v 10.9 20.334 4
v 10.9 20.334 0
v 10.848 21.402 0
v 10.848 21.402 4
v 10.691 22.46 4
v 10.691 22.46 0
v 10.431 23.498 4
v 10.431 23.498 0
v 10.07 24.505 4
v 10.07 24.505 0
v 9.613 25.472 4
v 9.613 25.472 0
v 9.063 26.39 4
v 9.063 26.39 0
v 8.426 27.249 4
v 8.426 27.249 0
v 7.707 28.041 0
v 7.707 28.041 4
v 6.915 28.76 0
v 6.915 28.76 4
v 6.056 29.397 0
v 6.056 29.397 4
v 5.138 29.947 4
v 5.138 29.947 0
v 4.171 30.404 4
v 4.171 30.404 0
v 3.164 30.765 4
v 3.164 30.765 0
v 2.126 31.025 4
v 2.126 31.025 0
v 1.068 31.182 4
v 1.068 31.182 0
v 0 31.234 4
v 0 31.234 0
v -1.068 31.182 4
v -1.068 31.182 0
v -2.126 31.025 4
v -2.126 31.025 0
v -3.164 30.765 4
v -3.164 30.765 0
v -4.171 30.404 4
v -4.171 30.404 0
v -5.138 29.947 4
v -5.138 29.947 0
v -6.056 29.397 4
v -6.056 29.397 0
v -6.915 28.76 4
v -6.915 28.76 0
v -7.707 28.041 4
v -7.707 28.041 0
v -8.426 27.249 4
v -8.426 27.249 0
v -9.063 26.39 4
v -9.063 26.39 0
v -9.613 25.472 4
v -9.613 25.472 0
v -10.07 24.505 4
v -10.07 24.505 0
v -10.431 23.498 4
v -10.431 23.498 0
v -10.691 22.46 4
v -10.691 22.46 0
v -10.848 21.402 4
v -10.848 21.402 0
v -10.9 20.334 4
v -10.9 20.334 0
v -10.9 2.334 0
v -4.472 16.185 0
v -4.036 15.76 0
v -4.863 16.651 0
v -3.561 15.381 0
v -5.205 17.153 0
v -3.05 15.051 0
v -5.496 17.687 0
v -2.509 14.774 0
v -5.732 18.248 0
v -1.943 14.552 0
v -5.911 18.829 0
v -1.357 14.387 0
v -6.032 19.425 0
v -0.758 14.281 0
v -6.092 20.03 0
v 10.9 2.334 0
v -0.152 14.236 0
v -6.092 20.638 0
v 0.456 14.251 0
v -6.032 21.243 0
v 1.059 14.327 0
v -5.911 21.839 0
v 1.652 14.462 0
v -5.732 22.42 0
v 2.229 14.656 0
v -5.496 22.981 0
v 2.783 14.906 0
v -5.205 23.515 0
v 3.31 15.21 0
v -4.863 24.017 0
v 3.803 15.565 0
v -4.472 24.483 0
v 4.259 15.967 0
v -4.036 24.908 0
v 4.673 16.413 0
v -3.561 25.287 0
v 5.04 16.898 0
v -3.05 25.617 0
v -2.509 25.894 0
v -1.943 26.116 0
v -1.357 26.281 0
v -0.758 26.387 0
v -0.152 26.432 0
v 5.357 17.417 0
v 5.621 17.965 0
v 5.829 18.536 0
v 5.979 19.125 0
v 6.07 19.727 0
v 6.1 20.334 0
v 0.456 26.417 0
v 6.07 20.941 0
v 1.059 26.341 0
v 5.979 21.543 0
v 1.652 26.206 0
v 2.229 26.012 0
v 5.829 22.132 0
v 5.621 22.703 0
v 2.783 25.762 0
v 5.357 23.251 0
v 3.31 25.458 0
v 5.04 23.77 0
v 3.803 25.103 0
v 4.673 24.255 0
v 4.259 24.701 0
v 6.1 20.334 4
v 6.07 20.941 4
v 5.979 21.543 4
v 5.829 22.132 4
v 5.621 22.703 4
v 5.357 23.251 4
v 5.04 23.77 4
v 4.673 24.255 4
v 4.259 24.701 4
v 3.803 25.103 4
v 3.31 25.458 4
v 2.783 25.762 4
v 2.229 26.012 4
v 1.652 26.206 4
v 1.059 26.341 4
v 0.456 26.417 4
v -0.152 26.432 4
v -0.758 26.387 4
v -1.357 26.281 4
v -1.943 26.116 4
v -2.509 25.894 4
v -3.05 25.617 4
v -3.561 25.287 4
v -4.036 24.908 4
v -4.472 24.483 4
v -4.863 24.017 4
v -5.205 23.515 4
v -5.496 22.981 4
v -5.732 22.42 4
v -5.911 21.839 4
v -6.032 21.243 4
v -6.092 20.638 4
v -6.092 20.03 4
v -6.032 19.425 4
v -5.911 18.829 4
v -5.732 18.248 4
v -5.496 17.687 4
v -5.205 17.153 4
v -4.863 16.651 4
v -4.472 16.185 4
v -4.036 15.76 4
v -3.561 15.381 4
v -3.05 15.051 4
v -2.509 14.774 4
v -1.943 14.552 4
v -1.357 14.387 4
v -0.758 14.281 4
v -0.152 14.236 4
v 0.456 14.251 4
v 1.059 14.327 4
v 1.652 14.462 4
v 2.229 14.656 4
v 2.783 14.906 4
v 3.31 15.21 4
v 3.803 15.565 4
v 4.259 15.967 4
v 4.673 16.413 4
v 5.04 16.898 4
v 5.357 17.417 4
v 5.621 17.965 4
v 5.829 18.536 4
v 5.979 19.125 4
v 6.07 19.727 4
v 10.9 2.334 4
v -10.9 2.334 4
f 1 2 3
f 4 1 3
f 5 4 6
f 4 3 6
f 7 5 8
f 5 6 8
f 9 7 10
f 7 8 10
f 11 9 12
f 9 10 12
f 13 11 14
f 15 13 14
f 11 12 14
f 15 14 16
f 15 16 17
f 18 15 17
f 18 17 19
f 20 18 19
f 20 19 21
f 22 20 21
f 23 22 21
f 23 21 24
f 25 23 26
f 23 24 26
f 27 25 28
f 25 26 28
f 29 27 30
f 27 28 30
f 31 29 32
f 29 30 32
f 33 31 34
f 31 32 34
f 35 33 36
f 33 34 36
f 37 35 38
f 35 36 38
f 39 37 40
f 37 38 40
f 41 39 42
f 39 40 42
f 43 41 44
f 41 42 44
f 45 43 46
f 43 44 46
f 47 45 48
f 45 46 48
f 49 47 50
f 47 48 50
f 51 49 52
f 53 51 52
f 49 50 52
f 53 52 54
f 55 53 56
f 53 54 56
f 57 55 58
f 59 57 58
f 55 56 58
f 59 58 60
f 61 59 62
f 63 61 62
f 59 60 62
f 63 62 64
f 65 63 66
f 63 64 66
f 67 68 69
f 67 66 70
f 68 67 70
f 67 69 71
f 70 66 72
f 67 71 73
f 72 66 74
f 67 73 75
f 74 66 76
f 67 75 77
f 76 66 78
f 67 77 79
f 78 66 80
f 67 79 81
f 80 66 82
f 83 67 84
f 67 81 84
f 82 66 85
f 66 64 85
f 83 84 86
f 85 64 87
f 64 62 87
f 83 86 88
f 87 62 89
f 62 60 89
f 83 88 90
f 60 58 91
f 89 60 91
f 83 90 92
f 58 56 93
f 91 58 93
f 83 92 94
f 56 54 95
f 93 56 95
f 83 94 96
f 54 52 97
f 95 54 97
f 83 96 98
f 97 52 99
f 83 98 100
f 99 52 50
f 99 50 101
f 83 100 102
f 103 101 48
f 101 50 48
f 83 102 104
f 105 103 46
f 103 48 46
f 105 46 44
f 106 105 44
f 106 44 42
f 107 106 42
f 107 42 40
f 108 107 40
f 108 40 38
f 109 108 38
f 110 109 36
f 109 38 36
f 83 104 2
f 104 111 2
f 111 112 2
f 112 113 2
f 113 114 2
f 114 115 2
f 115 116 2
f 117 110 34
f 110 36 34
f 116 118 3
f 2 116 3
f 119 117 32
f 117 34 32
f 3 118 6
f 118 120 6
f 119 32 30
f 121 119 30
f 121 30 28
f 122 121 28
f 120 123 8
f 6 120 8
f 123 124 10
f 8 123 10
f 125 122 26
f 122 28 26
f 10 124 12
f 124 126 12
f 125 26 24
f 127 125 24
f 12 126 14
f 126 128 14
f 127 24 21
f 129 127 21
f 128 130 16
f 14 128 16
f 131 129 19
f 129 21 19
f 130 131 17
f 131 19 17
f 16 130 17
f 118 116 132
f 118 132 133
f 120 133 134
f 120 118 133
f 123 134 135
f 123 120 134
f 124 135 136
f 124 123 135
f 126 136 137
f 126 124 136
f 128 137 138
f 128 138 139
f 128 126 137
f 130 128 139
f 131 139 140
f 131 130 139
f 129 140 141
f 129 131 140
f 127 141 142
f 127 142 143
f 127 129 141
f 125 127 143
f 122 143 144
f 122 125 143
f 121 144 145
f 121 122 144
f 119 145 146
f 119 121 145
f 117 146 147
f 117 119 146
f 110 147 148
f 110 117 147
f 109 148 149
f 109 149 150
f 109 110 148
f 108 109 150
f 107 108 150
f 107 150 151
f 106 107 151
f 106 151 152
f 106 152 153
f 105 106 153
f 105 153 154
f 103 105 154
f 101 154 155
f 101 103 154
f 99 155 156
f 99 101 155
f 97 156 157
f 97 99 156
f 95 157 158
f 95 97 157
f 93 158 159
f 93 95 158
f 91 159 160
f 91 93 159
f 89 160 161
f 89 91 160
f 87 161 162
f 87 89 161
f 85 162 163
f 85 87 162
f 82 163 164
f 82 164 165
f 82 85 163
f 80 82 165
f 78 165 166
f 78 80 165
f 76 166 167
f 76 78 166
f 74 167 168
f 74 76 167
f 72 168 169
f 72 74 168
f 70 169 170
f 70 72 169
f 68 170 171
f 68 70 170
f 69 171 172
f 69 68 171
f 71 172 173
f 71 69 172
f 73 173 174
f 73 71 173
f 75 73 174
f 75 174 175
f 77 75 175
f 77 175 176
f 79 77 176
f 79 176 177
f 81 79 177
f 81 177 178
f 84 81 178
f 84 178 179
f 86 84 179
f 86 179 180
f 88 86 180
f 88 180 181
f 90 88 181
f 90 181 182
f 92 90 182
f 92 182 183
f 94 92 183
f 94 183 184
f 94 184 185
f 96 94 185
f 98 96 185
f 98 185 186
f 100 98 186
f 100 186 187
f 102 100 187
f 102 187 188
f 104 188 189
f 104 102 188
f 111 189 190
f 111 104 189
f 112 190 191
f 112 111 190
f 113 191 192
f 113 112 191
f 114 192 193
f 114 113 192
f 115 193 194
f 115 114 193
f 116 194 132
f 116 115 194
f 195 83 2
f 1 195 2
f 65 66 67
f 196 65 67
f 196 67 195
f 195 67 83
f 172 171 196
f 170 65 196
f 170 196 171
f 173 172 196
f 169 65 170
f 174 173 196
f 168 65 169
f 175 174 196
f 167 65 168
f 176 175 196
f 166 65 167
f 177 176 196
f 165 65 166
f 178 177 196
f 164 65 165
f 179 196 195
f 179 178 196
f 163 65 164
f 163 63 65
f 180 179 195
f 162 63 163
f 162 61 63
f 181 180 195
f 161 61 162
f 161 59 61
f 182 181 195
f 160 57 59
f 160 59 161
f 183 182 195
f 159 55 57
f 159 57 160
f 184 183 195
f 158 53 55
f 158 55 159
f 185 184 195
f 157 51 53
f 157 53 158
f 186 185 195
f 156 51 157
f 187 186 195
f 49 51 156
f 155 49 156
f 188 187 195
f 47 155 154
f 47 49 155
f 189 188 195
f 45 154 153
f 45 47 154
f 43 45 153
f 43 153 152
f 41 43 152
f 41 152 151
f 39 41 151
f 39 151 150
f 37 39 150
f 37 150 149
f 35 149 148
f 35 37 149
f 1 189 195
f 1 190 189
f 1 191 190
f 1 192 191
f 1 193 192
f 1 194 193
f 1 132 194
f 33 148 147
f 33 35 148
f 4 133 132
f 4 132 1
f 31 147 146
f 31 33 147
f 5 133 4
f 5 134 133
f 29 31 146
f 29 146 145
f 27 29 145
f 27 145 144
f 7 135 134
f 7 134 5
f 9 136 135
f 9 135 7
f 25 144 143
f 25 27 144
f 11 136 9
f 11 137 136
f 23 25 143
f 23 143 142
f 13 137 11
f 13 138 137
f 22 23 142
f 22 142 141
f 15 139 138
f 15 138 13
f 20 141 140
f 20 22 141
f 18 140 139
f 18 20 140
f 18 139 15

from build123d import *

# Parameters (mm, degrees)
SKETCH_1_R      = 6.1
EXTRUDE_1_DEPTH = 4


with BuildPart() as part:
    # 스케치1 → 보스-돌출1 (new body)
    with BuildSketch(Plane.XY):
        with BuildLine():
            Line((-10.9, 20.333989173), (-10.9, 2.333989173))
            Line((-10.9, 2.333989173), (-8.65, 2.333989173))
            Line((-8.65, 2.333989173), (8.65, 2.333989173))
            Line((8.65, 2.333989173), (10.9, 2.333989173))
            Line((10.9, 2.333989173), (10.9, 20.333989173))
            ThreePointArc((10.9, 20.333989173), (0, 31.233989173), (-10.9, 20.333989173))
        make_face()
        with Locations((0, 20.333989173)):
            Circle(SKETCH_1_R, mode=Mode.SUBTRACT)
    extrude(amount=EXTRUDE_1_DEPTH)


solid = part.part
